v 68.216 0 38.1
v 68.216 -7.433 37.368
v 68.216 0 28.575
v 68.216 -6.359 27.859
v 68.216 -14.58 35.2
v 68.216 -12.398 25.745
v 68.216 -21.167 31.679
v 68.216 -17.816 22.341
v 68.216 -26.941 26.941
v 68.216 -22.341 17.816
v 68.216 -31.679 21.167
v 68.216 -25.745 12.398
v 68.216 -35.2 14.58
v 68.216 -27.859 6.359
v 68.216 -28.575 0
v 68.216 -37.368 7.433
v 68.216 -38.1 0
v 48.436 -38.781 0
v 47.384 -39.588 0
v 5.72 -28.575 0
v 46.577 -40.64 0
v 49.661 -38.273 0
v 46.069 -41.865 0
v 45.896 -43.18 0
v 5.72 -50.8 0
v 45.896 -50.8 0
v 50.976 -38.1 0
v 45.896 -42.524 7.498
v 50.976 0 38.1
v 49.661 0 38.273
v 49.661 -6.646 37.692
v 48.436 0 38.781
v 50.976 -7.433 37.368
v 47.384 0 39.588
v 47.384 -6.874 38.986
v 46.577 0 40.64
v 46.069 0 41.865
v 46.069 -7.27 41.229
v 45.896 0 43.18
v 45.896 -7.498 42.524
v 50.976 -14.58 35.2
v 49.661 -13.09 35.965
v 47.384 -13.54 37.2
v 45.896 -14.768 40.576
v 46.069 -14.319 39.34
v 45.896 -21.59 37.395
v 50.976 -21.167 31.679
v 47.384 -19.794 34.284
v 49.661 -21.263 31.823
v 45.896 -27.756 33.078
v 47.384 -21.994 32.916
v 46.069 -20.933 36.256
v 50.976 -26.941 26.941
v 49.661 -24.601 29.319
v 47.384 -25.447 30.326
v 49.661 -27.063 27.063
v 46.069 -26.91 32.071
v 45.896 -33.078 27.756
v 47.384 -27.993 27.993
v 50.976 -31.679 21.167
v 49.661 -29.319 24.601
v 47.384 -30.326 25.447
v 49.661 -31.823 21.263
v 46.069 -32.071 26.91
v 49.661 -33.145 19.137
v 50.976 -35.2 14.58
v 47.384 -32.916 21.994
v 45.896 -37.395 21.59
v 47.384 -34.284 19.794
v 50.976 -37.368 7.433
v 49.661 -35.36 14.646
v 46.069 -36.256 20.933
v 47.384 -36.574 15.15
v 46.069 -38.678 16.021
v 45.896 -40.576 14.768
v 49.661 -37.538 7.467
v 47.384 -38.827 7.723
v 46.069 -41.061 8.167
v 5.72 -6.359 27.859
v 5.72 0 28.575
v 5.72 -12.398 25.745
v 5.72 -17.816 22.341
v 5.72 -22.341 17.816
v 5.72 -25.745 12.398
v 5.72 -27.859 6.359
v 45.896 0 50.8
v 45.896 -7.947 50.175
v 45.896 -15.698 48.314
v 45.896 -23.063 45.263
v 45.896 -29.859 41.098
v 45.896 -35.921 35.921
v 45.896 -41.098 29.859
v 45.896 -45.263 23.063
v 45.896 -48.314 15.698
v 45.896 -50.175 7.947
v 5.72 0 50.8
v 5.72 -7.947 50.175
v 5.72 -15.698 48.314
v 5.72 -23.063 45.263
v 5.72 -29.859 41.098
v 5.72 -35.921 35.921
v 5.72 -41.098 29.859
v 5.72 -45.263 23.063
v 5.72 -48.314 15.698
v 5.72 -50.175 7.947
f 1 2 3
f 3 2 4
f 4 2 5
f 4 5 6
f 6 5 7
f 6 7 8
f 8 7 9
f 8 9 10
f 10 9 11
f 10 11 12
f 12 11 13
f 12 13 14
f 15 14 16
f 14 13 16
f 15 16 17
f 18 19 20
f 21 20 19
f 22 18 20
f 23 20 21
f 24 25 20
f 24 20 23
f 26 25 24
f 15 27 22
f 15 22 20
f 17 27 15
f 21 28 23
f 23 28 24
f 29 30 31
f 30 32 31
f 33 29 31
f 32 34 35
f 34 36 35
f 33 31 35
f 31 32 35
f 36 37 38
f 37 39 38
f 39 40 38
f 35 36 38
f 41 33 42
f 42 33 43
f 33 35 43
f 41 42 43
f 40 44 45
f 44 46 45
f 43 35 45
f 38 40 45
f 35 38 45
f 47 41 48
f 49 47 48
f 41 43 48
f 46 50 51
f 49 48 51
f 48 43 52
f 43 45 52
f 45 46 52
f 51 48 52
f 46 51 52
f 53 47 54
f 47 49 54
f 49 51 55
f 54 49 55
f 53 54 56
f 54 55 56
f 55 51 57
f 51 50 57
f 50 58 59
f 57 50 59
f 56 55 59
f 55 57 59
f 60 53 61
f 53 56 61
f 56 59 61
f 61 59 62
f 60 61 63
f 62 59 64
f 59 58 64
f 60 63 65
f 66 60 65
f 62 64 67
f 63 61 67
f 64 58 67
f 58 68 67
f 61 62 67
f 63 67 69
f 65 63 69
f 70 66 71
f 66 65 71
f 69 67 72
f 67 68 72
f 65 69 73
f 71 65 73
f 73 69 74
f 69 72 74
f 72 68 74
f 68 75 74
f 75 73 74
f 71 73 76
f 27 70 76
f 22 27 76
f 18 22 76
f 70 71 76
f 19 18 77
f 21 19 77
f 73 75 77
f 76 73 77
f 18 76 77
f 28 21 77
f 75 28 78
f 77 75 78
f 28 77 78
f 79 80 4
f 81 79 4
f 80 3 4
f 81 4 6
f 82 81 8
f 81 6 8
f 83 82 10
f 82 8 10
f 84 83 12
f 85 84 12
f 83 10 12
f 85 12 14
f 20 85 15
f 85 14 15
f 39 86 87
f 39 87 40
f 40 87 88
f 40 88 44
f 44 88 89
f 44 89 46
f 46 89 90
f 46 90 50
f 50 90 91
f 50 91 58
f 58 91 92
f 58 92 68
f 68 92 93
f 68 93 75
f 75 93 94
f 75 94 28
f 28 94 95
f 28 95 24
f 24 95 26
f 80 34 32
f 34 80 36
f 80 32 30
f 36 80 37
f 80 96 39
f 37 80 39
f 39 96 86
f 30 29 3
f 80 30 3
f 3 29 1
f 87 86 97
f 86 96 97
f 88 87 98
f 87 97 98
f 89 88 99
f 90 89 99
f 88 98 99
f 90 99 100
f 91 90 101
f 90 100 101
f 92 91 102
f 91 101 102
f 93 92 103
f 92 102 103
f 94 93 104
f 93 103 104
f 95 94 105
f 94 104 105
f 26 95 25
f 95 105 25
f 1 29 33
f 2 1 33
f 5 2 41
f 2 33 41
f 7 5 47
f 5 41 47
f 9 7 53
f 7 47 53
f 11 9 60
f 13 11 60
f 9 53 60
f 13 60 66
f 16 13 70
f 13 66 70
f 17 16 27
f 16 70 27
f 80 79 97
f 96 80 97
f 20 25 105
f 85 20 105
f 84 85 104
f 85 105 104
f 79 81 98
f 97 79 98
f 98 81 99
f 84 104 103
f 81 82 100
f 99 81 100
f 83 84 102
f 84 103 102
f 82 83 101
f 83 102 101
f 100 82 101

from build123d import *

# Parameters (mm, degrees)
F1_ANGLE = 90
F2_R     = 5.08


with BuildPart() as f1:
    # F0 (on Front) → F1 (revolve)
    with BuildSketch(Plane.XZ):
        Polygon((45.896156, 50.8), (5.719585, 50.8), (5.719585, 28.575), (68.21648, 28.575), (68.21648, 38.1), (45.896156, 38.1), align=None)
    revolve(axis=Axis((39.269814, 0, 0), (1, 0, 0)), revolution_arc=F1_ANGLE)

    # F2
    f2_edges = [f1.edges().sort_by_distance(p)[0] for p in [
        (45.896156, -26.940768, 26.940768),
    ]]
    fillet(f2_edges, radius=F2_R)


solid = f1.part
